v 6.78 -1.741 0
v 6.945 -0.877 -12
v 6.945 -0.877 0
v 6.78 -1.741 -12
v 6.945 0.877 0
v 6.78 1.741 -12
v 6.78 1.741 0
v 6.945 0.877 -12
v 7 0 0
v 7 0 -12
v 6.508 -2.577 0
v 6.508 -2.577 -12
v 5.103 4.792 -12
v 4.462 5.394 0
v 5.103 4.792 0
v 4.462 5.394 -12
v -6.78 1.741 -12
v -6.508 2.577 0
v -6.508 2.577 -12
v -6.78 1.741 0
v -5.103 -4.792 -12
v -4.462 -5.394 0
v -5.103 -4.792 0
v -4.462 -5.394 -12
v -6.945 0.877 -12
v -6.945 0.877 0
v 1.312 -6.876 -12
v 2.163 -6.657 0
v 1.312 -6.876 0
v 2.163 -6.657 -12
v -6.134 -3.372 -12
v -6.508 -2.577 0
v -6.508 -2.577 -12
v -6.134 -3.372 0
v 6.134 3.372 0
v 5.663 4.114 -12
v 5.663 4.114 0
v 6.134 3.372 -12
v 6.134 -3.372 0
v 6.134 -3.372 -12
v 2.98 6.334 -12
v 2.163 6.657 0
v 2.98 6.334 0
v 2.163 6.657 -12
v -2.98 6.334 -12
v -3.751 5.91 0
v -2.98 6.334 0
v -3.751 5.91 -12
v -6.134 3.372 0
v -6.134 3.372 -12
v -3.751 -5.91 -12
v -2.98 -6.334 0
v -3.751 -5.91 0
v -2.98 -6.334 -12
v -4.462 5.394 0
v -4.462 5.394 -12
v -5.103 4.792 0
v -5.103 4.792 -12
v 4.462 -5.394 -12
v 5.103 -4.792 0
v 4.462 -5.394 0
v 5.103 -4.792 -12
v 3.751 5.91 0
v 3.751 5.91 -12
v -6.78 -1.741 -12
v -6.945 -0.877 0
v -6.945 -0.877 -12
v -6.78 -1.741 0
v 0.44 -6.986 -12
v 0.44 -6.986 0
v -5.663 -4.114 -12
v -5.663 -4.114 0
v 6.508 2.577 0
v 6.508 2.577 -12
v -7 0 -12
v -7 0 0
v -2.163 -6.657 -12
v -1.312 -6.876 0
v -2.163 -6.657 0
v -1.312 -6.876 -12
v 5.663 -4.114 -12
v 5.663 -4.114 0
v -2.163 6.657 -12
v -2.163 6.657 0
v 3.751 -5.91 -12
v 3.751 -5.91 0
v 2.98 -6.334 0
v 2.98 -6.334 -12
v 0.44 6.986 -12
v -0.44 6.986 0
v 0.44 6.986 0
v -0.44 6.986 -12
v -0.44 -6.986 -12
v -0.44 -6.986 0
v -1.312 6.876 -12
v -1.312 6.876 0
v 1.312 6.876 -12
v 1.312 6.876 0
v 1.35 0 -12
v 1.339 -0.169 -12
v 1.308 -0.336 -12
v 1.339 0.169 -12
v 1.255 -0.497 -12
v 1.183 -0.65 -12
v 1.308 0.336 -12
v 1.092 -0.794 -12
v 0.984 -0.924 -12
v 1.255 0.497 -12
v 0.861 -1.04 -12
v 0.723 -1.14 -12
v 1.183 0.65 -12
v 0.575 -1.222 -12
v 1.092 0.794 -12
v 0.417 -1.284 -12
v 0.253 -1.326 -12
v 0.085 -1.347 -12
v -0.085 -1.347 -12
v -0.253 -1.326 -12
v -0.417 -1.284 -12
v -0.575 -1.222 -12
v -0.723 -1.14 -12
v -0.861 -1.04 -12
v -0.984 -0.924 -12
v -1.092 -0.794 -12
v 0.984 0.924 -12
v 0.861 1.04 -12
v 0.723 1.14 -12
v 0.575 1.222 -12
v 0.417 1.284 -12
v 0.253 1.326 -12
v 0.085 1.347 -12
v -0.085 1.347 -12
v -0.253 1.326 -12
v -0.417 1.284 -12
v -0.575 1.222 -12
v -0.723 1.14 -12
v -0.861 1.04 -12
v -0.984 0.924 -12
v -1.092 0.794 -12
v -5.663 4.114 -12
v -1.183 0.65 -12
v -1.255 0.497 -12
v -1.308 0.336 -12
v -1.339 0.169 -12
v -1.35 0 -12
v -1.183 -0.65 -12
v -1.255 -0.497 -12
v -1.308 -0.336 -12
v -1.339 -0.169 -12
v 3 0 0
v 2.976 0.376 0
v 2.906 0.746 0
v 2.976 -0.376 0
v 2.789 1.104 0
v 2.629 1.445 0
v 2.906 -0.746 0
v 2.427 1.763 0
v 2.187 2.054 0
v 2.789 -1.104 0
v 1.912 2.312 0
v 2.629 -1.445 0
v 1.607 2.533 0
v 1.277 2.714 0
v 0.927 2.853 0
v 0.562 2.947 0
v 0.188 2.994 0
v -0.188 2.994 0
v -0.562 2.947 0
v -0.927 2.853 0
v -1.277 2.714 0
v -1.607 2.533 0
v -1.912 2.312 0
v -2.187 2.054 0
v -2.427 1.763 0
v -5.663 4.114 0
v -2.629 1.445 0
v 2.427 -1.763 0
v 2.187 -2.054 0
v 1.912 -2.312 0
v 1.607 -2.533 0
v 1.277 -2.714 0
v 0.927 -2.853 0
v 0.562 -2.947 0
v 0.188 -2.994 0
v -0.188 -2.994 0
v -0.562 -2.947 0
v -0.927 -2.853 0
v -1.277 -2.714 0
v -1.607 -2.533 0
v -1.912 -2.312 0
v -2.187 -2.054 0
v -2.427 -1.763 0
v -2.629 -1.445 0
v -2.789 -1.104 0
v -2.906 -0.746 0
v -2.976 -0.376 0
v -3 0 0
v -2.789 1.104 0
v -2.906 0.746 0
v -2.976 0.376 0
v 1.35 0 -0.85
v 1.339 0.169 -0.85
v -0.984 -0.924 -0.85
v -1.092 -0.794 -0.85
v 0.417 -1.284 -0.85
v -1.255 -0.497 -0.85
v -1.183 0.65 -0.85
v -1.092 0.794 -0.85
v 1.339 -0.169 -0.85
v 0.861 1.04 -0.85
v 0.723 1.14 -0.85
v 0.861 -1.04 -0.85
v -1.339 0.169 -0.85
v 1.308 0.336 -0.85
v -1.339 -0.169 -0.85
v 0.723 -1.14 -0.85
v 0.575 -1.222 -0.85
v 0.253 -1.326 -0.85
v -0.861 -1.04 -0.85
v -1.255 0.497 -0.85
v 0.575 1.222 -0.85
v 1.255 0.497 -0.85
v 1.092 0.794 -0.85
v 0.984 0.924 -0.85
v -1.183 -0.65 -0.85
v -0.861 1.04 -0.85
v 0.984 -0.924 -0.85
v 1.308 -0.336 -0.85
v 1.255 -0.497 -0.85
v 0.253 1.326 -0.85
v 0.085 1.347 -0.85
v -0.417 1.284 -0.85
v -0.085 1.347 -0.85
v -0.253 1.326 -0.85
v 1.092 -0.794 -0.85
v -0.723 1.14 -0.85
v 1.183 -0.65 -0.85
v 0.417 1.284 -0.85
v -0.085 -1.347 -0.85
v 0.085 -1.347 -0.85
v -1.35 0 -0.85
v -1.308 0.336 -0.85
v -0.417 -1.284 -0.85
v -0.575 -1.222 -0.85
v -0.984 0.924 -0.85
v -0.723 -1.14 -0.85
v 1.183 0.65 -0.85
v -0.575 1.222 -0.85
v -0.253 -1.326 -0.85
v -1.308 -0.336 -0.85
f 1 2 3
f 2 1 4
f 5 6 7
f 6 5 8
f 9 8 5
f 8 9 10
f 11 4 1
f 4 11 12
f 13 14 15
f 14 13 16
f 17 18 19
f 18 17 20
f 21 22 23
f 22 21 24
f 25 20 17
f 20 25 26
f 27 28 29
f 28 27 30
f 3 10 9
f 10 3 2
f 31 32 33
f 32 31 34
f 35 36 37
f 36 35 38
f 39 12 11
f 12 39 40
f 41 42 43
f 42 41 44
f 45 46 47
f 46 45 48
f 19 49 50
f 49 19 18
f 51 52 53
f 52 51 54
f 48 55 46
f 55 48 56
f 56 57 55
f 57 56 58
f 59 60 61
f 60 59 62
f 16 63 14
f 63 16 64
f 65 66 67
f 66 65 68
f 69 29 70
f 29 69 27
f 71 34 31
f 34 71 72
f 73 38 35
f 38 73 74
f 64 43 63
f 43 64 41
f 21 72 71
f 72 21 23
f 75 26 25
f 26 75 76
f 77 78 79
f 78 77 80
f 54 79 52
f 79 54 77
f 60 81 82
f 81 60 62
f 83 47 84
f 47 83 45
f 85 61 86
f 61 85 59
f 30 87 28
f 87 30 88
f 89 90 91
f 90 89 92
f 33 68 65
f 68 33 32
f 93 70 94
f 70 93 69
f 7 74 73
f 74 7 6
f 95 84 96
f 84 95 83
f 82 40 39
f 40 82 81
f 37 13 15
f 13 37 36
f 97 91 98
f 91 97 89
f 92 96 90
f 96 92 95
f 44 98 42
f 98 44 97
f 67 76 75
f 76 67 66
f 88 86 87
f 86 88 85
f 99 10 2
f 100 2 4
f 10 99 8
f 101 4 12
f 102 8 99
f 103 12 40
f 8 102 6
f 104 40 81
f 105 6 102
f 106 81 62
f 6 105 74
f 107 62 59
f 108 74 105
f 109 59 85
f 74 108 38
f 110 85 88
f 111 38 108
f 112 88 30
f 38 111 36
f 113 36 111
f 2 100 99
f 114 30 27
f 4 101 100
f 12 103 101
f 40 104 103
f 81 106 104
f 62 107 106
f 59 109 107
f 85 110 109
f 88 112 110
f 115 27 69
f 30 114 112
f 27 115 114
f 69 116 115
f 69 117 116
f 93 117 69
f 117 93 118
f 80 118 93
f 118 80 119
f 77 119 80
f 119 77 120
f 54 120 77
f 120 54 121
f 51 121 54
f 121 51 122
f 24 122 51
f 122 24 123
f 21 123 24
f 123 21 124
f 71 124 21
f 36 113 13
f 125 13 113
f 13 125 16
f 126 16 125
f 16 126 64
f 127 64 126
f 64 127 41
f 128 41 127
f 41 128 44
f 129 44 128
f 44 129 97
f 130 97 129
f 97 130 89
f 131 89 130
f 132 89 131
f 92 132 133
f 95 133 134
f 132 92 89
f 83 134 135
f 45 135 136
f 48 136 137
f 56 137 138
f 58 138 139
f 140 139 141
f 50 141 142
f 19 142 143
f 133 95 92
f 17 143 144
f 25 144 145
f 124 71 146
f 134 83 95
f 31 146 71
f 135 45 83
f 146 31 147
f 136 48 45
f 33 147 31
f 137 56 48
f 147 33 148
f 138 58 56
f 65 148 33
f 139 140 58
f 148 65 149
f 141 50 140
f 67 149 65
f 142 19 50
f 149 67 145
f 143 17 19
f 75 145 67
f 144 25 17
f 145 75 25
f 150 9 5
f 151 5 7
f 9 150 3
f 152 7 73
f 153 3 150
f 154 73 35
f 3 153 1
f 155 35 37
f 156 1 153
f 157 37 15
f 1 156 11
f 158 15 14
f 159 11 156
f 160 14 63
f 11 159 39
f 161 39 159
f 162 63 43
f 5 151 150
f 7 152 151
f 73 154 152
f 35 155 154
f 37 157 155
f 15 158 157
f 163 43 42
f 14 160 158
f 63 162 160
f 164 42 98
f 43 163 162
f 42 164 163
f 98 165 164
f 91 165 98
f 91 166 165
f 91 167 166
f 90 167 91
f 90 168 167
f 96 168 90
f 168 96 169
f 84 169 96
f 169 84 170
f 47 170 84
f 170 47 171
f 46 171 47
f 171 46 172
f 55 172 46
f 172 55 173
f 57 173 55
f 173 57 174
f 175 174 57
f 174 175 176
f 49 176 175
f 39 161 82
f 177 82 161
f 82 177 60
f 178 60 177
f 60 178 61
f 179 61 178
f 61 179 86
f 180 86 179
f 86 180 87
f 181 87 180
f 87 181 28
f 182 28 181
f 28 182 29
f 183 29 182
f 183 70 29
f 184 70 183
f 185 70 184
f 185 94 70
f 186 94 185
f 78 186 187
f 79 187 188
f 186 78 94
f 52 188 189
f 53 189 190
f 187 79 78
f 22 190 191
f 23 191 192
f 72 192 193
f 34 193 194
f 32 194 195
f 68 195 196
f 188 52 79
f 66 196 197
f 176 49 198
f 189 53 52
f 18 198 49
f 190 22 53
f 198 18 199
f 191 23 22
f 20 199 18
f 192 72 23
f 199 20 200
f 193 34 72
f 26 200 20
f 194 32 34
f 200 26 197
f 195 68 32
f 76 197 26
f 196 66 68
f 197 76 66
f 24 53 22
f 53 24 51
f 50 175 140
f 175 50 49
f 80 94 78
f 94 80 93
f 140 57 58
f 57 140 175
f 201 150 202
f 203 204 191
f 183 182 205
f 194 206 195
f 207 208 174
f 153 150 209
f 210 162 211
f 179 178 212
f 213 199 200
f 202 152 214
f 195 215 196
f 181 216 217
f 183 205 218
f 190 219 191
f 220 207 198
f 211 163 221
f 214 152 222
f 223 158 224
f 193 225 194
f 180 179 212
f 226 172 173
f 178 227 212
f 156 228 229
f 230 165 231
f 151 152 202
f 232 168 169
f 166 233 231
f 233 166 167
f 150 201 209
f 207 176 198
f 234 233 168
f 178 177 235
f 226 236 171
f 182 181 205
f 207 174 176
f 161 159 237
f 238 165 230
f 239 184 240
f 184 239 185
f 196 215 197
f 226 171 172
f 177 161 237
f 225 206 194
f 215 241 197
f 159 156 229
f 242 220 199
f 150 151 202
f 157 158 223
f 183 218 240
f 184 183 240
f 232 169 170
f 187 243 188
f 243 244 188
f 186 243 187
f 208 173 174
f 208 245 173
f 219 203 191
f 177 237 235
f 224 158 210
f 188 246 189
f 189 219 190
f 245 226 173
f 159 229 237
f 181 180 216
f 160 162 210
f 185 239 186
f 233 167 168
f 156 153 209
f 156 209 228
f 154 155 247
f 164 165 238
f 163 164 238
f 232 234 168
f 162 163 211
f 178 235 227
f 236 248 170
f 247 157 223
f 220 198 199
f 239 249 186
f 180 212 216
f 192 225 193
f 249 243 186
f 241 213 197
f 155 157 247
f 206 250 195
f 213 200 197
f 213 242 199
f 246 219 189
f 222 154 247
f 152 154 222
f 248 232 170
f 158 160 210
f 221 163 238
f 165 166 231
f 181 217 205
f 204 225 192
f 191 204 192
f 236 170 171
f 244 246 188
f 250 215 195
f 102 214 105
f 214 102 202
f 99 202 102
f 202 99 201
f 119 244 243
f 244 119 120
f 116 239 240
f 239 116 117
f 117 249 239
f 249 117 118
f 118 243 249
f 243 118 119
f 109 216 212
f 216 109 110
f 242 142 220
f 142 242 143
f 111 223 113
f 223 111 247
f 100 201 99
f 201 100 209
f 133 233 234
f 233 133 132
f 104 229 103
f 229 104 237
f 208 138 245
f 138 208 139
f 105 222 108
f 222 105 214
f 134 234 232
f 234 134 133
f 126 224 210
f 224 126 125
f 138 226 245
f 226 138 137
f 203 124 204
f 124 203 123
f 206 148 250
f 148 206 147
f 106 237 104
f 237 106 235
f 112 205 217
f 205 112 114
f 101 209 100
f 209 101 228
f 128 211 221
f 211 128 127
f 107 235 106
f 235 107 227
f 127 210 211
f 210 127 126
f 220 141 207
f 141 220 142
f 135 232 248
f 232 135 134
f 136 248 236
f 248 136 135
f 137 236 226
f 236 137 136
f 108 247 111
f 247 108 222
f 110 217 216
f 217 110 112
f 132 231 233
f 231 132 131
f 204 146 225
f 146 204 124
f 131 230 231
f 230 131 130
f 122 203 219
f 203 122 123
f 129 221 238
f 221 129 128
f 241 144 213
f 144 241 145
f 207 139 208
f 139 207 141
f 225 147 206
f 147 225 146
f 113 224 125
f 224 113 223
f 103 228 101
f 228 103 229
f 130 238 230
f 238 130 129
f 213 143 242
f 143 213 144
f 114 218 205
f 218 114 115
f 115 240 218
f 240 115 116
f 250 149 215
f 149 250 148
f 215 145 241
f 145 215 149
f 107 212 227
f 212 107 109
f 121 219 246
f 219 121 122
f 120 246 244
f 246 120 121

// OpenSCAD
$fn = 50;


difference() {
	union() {
		translate(v = [0, 0, -12.0000000000]) {
			cylinder(h = 12, r = 7.0000000000);
		}
		translate(v = [0, 0, -12.0000000000]) {
			cylinder(h = 12, r = 2.8750000000);
		}
	}
	union() {
		translate(v = [0, 0, 0]) {
			rotate(a = [0, 0, 0]) {
				difference() {
					union() {
						translate(v = [0, 0, -12.0000000000]) {
							cylinder(h = 12, r = 1.0000000000);
						}
						translate(v = [0, 0, -0.8500000000]) {
							cylinder(h = 0.8500000000, r1 = 1.3500000000, r2 = 3.0000000000);
						}
						translate(v = [0, 0, -12.0000000000]) {
							cylinder(h = 12, r = 1.3500000000);
						}
						translate(v = [0, 0, -12.0000000000]) {
							cylinder(h = 12, r = 1.0000000000);
						}
					}
					union();
				}
			}
		}
	}
}
